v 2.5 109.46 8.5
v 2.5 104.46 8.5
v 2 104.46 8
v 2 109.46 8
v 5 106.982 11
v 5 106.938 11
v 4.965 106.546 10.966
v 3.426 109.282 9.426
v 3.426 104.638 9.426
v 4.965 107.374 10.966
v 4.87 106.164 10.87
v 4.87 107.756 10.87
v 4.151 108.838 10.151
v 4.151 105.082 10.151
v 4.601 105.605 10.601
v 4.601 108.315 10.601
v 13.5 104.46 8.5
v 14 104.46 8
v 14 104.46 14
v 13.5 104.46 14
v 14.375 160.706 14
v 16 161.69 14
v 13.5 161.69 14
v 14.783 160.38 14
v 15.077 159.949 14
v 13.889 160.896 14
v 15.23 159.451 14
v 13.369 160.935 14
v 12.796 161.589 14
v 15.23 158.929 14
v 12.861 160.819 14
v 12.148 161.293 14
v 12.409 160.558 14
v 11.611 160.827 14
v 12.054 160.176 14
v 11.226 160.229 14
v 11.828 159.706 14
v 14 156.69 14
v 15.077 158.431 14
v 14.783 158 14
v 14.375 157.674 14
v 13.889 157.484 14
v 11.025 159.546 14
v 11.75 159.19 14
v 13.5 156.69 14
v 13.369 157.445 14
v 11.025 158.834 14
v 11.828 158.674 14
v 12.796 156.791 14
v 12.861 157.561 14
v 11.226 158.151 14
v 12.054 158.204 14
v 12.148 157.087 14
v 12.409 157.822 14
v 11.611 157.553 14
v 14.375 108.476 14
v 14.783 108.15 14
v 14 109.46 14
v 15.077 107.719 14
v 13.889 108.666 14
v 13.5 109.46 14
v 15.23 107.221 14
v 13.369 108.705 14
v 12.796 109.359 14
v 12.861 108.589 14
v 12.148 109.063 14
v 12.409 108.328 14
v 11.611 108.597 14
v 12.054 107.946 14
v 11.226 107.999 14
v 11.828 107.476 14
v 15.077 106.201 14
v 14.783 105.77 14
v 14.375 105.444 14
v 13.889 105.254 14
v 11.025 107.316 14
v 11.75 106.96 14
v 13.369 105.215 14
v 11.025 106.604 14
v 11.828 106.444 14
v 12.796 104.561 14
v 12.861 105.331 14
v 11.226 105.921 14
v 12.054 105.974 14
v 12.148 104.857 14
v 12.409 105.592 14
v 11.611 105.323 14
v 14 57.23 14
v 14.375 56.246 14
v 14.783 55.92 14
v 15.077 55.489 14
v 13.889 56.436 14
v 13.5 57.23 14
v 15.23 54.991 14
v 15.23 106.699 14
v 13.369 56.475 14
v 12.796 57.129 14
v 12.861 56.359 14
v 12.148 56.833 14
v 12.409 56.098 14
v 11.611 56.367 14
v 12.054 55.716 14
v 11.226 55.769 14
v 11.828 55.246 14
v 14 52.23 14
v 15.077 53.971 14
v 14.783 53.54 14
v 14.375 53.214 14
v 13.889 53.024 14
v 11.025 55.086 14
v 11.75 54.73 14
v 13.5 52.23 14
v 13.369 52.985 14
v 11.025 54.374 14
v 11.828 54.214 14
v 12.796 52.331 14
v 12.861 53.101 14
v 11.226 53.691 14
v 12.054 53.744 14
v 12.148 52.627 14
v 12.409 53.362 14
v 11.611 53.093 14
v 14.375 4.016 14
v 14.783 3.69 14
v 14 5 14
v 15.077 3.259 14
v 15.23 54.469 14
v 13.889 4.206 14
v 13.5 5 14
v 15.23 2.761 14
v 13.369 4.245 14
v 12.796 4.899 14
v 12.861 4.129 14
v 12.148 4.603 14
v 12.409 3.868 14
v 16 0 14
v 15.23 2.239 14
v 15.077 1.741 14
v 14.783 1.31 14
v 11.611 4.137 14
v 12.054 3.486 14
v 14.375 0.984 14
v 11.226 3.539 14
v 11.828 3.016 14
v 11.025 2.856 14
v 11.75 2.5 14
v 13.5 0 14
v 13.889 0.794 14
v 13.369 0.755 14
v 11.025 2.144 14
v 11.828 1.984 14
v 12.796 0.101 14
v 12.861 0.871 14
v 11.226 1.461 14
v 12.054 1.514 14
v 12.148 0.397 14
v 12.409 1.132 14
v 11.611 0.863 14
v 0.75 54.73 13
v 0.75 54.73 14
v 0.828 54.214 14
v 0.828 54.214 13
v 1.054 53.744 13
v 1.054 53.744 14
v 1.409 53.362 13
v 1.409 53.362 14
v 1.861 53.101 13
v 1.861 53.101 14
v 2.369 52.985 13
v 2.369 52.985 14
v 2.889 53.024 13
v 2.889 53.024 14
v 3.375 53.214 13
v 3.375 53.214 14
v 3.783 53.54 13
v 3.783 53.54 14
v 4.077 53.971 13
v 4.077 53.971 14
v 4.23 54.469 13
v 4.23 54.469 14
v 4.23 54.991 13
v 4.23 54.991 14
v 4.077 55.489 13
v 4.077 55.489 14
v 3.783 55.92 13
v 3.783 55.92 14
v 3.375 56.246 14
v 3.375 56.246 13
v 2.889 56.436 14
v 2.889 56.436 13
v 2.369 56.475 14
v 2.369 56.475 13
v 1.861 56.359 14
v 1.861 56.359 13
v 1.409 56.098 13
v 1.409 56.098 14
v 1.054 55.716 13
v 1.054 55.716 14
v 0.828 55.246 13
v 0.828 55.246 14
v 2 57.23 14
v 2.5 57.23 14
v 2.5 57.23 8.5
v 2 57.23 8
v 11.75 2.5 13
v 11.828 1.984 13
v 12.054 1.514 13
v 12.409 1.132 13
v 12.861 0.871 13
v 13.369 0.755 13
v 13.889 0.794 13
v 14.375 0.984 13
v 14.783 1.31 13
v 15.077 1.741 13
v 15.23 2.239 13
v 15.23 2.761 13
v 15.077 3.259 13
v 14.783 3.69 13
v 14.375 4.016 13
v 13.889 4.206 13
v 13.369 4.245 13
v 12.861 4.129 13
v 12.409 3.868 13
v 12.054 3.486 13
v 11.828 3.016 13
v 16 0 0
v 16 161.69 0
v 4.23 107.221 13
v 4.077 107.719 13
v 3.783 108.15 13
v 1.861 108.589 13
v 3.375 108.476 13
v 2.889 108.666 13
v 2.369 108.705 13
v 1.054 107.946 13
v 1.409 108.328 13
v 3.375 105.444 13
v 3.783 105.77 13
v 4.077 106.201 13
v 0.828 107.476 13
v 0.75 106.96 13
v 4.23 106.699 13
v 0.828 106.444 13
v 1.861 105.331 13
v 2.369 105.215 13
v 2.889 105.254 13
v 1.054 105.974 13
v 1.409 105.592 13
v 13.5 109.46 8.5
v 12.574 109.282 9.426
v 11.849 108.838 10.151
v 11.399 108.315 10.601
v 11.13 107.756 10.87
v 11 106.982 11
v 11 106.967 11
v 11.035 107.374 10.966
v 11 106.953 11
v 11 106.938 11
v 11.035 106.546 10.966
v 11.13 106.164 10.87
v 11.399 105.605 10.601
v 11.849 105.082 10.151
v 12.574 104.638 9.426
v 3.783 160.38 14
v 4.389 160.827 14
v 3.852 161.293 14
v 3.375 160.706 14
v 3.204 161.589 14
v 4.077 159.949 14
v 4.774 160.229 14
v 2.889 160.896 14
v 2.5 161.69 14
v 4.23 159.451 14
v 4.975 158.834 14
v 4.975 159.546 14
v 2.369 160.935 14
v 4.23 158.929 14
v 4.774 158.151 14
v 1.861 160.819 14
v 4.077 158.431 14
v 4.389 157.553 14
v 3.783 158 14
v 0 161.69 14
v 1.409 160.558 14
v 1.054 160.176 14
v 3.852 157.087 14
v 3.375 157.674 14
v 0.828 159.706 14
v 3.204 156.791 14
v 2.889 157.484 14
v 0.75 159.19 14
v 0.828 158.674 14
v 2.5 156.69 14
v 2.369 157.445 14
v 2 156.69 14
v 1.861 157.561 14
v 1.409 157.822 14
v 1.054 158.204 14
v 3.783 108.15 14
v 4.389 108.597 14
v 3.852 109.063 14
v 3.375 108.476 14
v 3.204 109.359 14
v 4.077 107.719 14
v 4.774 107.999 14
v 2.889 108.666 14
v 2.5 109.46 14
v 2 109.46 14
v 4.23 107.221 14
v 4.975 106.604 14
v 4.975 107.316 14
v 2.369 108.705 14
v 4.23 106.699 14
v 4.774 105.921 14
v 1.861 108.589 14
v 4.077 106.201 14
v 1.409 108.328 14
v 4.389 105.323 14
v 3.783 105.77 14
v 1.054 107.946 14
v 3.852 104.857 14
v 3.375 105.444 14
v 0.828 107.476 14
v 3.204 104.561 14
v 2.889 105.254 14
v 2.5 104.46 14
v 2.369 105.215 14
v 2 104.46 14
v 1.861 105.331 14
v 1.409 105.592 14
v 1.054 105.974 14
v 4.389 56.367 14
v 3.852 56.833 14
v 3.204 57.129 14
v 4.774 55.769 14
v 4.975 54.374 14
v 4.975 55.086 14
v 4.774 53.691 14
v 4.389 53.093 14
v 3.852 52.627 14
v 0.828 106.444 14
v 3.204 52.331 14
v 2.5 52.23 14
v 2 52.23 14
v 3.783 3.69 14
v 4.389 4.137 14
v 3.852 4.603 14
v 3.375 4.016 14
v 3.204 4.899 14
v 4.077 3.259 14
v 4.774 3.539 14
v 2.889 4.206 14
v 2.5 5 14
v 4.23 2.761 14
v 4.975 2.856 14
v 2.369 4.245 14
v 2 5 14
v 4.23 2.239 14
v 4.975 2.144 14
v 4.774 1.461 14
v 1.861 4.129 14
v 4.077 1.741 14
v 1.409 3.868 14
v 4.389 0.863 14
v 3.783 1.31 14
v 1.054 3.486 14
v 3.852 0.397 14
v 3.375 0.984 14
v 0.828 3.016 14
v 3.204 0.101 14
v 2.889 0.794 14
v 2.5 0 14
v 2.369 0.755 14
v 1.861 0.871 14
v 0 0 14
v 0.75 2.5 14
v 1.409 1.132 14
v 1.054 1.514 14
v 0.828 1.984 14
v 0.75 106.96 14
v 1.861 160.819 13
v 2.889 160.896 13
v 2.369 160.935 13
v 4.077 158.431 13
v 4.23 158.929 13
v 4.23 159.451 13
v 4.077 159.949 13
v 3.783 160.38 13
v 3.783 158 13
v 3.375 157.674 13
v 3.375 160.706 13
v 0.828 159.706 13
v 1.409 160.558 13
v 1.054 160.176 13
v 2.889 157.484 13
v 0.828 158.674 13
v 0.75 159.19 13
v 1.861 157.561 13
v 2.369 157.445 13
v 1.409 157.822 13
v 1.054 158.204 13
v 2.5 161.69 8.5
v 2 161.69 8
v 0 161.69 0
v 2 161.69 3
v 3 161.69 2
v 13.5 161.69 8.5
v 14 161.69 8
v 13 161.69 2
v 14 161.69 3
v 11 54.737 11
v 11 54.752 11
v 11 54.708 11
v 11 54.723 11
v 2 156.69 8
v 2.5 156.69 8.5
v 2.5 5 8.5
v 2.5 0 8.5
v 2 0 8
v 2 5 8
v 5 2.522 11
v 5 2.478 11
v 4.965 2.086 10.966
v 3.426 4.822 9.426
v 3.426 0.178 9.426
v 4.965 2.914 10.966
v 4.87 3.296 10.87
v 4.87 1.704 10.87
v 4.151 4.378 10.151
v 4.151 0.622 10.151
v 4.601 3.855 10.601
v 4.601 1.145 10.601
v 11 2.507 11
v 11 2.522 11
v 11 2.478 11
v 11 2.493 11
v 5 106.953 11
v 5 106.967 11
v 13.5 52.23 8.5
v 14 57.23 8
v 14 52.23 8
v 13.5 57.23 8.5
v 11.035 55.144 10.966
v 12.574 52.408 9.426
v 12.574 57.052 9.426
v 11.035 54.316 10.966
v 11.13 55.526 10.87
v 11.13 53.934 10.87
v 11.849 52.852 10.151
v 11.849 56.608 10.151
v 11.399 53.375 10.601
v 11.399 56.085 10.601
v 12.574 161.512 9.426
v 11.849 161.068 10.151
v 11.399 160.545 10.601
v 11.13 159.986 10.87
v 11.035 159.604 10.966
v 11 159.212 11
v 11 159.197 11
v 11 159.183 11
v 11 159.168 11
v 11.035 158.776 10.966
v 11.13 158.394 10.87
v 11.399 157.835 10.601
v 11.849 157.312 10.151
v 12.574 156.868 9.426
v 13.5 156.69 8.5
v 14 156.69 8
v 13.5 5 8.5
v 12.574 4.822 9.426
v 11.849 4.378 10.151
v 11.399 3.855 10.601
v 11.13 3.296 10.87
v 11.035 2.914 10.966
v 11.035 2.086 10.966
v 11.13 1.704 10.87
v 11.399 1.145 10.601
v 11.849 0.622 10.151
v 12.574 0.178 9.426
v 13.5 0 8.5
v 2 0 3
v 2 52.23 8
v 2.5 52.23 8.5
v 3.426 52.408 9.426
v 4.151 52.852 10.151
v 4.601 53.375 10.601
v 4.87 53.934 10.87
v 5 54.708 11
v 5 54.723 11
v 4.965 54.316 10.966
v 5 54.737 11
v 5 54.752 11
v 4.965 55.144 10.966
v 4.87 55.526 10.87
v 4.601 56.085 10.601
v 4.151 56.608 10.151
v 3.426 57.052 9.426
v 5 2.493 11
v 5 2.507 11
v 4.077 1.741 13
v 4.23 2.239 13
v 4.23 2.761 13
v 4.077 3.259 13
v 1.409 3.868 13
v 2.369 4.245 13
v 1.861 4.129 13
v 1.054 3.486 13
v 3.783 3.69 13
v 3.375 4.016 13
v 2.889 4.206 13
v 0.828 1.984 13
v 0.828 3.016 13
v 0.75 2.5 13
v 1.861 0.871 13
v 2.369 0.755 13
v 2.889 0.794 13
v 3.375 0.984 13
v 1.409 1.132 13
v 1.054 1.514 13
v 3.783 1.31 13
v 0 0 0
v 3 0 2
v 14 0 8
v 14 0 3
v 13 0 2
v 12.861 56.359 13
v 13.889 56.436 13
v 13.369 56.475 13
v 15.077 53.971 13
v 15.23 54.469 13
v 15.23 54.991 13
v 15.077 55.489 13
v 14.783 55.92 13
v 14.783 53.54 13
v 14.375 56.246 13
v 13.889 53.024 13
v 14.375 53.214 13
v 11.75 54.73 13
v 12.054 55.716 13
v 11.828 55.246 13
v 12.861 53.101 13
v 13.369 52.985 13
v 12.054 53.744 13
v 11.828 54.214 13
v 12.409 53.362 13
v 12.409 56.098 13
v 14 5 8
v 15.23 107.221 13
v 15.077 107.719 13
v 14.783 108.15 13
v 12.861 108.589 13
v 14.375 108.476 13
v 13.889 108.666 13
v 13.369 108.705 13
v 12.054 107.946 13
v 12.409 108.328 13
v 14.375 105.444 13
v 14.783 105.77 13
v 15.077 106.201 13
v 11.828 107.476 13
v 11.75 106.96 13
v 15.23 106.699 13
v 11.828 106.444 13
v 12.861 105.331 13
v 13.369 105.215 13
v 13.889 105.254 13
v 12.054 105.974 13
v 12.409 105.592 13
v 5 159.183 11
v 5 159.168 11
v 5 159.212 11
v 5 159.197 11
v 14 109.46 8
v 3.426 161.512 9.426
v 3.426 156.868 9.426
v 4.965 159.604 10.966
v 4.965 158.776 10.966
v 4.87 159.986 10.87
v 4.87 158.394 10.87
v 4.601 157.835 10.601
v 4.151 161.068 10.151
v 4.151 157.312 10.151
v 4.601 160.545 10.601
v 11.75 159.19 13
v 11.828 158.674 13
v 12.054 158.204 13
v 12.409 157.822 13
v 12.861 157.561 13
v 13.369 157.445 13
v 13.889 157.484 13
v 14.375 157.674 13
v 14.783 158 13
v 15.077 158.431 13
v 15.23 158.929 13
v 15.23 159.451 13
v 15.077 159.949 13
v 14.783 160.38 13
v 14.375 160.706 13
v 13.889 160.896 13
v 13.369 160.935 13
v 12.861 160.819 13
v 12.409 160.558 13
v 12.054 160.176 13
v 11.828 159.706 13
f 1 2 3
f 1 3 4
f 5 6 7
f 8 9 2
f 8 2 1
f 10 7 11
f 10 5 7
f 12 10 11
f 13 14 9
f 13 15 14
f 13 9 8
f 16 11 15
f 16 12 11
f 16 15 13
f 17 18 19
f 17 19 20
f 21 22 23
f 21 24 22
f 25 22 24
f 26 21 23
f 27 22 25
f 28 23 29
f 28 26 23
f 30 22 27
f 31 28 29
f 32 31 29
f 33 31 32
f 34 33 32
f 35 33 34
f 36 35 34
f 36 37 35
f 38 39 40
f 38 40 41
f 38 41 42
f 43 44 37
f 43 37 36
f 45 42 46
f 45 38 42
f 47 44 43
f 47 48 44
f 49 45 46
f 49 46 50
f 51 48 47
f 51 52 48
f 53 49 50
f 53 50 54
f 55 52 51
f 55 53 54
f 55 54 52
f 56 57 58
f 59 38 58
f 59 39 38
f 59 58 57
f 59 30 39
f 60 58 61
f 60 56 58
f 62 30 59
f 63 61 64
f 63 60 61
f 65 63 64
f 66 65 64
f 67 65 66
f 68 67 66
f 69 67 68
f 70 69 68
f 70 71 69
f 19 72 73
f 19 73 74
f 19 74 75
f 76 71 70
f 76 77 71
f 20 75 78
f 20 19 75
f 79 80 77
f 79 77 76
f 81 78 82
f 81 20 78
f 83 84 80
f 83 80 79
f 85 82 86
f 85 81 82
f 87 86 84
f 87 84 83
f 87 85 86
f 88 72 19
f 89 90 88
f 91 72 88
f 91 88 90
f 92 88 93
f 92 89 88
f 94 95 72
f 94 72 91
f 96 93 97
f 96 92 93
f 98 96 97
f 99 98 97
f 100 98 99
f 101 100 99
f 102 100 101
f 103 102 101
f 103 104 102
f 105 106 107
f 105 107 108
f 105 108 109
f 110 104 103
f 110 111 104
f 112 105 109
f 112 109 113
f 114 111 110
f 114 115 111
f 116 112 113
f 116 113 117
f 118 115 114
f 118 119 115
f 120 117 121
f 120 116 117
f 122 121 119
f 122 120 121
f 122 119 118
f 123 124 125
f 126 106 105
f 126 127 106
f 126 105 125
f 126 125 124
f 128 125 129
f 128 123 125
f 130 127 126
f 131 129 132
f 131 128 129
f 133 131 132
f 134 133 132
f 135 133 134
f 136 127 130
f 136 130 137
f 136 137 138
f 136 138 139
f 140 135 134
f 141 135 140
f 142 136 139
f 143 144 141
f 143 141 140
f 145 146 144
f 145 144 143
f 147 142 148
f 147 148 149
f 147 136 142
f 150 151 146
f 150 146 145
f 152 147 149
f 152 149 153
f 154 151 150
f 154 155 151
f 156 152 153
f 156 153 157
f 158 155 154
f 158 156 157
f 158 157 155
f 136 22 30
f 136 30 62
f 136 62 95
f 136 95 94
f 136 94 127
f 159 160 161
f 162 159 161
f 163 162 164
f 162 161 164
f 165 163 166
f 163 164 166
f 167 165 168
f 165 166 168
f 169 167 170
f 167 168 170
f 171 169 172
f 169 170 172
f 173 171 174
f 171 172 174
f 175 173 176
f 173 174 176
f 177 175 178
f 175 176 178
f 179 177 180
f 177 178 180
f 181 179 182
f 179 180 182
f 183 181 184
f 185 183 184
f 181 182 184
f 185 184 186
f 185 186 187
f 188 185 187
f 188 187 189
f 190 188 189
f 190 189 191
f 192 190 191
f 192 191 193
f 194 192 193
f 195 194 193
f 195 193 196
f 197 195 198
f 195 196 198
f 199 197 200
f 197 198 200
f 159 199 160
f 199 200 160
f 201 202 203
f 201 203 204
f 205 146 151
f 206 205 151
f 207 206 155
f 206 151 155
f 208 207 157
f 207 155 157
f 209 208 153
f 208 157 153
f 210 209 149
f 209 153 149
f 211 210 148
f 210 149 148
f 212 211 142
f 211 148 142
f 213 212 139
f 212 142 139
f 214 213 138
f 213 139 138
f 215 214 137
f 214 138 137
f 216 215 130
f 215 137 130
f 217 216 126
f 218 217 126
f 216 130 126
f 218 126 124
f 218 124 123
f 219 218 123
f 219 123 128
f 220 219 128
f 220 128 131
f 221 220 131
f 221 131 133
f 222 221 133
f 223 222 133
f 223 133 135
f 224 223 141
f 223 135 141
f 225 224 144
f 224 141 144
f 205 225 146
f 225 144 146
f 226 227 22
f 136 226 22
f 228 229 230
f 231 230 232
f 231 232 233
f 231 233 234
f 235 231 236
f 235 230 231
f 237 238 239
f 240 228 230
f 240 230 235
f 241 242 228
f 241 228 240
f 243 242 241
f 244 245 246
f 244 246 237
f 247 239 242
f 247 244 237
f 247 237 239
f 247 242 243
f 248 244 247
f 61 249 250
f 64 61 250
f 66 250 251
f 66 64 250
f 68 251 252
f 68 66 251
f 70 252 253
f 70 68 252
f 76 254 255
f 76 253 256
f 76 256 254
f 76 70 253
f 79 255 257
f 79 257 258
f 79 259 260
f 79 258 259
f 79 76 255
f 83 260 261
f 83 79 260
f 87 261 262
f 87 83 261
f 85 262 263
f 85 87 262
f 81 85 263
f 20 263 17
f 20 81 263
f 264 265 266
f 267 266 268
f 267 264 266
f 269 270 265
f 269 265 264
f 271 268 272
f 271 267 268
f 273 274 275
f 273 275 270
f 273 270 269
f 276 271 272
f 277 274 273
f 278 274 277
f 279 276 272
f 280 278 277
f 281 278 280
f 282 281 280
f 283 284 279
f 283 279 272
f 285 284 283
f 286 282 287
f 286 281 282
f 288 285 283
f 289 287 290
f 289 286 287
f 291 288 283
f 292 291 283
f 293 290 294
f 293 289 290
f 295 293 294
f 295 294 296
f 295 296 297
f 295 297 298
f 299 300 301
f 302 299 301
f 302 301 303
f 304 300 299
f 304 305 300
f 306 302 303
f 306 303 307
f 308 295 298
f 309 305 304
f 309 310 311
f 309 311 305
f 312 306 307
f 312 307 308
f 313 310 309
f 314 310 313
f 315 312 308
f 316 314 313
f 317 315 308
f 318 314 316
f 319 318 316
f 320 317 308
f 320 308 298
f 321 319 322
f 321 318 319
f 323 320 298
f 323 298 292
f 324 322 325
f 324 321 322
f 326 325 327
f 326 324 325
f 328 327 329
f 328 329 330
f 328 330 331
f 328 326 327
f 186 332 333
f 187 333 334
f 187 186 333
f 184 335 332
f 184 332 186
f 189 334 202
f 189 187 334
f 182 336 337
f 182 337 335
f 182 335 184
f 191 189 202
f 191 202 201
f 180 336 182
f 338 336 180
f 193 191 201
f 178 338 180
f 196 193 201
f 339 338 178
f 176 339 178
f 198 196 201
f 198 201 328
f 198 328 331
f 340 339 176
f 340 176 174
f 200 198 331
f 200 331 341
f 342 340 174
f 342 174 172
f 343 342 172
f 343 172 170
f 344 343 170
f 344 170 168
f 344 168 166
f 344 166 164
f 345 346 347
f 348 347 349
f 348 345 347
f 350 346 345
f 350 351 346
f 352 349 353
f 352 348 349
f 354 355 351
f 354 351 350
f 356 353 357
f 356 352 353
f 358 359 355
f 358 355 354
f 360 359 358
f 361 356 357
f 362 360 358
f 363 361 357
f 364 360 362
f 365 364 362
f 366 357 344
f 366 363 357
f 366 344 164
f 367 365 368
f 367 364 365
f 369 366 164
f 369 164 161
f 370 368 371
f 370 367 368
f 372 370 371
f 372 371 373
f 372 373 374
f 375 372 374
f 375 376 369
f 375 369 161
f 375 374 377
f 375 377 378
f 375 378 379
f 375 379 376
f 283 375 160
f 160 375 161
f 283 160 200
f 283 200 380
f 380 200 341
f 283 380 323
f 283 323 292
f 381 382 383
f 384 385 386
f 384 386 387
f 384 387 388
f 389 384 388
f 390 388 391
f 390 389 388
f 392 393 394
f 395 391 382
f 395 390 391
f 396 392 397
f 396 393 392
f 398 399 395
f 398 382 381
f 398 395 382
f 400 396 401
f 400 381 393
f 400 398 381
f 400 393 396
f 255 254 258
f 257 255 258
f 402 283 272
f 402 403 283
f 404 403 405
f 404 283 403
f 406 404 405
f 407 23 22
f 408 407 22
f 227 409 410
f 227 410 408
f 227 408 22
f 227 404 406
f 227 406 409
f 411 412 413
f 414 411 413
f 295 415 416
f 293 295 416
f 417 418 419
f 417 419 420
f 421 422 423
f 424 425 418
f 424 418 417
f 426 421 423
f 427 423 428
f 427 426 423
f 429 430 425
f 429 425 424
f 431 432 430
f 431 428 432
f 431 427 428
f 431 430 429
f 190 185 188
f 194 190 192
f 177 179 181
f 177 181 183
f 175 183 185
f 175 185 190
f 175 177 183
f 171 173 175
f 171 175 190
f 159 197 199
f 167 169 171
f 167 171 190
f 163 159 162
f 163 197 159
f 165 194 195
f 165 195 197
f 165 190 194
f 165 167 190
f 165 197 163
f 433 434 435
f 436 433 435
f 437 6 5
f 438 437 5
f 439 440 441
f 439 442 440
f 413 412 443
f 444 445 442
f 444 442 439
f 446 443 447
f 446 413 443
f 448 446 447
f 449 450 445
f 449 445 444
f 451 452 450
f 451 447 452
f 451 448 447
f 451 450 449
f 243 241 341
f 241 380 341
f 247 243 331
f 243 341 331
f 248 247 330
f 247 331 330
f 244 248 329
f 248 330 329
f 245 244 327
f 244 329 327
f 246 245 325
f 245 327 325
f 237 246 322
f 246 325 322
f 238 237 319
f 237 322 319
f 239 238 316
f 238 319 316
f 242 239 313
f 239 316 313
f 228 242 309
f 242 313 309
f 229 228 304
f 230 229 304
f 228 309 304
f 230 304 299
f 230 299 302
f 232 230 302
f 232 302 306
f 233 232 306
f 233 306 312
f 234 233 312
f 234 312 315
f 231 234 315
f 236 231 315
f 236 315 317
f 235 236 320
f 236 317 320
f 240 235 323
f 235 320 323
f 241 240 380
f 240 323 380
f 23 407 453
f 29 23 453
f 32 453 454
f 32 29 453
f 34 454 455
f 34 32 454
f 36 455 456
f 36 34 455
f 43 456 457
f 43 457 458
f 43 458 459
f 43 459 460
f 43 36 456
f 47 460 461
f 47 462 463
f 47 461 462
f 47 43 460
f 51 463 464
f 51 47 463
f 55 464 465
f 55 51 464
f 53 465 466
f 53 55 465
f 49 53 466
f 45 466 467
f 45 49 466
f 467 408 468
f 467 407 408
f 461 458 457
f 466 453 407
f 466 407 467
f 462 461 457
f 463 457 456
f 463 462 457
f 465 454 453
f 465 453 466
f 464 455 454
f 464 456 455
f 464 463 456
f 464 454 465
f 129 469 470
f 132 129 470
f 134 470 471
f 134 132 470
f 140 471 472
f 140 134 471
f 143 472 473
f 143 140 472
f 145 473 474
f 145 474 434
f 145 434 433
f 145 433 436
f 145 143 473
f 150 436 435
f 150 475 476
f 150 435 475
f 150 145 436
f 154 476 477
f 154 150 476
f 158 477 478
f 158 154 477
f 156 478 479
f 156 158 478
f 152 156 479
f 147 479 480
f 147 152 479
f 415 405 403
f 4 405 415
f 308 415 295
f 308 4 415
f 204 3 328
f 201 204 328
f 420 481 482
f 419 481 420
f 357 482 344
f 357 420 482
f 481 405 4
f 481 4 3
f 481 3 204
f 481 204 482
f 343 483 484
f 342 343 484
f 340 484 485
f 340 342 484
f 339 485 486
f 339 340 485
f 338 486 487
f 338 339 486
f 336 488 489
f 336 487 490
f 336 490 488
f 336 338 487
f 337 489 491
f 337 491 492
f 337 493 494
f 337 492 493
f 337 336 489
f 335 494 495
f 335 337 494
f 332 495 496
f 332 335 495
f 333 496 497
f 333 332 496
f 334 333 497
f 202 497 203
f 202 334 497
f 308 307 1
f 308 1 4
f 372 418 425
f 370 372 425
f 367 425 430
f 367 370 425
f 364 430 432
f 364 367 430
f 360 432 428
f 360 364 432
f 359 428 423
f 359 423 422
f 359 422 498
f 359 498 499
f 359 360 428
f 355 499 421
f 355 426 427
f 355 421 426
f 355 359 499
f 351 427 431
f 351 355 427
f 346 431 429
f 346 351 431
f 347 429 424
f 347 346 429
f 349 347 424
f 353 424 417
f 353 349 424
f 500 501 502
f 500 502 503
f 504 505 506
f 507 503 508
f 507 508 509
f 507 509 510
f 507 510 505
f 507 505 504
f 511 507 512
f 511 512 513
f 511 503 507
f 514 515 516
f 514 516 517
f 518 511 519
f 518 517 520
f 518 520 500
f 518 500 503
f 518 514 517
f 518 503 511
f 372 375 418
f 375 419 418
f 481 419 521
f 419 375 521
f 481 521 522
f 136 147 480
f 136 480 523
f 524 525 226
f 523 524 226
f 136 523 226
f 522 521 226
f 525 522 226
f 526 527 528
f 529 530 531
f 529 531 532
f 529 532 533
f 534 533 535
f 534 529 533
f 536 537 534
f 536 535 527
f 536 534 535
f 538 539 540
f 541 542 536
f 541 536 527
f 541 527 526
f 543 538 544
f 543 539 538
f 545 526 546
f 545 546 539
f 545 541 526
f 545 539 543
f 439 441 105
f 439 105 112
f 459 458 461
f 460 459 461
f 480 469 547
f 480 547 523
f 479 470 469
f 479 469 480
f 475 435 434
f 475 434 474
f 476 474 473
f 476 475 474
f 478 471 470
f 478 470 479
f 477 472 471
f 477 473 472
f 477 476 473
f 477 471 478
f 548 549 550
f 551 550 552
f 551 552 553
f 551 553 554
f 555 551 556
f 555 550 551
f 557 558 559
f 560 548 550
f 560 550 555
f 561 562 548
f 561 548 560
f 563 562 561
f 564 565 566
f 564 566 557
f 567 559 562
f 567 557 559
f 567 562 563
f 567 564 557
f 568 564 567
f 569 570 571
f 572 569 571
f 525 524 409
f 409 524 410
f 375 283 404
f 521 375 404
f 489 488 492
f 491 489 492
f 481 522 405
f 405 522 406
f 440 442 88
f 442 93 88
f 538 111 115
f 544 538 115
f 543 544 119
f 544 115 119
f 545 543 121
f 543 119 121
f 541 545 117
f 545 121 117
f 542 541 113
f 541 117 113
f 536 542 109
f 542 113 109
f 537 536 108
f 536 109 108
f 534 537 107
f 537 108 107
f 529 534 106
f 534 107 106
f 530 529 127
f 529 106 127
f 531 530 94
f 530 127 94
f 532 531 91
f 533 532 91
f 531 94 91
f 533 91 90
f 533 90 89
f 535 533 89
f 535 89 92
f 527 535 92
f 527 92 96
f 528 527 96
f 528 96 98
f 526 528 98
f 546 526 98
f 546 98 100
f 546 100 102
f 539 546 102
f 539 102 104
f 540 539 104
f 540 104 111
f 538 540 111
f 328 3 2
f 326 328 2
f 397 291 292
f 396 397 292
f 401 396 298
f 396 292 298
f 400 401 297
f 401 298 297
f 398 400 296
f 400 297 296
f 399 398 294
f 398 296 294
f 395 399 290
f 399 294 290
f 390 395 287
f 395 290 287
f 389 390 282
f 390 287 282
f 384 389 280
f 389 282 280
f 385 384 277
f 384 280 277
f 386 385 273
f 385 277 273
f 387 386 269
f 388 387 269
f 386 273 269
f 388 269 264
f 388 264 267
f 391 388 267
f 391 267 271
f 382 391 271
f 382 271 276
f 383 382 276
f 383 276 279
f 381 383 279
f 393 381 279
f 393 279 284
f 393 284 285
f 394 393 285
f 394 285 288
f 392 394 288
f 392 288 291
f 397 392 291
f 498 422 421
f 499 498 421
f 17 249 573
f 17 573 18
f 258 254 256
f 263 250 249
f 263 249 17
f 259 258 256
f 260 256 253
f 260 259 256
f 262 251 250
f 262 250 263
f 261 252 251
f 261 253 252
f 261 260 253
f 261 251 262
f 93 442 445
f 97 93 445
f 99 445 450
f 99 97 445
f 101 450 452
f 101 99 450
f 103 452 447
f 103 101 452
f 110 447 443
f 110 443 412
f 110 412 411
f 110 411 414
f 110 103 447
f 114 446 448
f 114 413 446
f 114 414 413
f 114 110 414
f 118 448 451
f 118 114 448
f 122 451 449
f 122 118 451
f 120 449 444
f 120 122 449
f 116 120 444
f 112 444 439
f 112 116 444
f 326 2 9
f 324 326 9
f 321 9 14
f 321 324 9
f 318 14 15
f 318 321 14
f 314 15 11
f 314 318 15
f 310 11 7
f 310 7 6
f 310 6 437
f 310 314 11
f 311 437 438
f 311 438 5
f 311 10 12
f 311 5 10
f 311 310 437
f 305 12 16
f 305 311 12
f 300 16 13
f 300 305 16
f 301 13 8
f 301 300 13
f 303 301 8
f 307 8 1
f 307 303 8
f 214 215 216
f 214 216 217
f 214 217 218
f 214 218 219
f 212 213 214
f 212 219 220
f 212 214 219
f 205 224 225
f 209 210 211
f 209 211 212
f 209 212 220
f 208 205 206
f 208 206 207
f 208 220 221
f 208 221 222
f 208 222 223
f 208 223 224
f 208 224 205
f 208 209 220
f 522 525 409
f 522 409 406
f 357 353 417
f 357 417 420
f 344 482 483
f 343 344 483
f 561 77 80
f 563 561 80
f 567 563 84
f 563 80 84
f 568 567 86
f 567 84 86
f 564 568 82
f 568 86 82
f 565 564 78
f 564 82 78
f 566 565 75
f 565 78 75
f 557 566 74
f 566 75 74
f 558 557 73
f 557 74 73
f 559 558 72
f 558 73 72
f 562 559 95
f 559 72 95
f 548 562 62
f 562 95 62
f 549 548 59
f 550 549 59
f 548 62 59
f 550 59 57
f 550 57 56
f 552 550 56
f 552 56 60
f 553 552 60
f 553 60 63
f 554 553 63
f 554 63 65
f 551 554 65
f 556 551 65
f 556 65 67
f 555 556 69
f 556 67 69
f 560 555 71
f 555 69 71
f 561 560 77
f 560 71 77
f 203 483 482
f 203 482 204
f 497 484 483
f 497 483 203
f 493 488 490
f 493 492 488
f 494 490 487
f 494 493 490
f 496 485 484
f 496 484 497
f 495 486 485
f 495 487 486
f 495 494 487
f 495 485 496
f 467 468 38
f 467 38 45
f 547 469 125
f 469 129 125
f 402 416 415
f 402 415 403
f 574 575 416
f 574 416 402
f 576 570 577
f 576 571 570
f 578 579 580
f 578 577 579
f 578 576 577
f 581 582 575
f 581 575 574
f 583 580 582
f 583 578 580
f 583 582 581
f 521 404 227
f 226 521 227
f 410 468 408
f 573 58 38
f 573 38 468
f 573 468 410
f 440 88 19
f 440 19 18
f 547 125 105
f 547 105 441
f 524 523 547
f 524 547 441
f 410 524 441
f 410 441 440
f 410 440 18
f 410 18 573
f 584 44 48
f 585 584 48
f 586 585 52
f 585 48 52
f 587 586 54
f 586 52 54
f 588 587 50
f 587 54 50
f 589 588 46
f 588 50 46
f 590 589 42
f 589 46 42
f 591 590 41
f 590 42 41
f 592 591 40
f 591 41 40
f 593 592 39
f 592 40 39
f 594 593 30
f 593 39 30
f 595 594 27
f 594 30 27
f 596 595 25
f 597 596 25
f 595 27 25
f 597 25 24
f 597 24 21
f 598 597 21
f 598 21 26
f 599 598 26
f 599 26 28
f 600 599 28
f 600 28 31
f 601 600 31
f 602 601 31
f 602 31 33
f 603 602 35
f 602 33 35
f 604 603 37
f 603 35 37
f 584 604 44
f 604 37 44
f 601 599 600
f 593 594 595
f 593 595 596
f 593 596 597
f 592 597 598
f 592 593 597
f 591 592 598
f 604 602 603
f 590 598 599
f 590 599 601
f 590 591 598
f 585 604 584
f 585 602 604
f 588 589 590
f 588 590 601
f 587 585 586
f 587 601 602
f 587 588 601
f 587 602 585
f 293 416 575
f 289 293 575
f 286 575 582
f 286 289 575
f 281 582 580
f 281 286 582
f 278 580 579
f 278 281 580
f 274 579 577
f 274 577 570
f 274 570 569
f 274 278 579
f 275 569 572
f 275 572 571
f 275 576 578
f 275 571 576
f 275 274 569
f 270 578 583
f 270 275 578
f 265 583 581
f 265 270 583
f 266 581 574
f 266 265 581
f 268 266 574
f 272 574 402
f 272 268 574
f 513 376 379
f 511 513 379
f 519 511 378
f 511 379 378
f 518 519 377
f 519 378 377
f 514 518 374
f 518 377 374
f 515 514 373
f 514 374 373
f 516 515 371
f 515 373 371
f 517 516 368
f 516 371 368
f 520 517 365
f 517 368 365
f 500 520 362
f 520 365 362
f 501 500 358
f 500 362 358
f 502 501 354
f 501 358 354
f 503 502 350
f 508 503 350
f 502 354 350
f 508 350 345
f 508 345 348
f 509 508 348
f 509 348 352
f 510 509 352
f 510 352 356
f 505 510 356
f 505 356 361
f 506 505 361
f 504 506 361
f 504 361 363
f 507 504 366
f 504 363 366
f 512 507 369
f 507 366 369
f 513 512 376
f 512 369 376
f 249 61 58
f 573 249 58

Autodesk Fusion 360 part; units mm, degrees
sketch "3D-printed conduit outline" plane through (0, 0, 0) normal (0, 1, 0) x (1, 0, 0)
  line L0 (0, 0) -> (16, 0)
  line L1 (16, 0) -> (16, -14)
  line L2 (16, -14) -> (0, -14)
  line L3 (0, -14) -> (0, 0)
  line L4 (2, -14) -> (14, -14)
  line L5 (14, -14) -> (14, -2)
  line L6 (14, -2) -> (2, -2)
  line L7 (2, -2) -> (2, -14)
  dimension "d8" = 14
  dimension "d9" = 16
  dimension "d10" = 2
  dimension "d11" = 2
  dimension "d12" = 2
extrude "Extrude1" add sketch "3D-printed conduit outline" along normal blind 161.69 contours L0 L1 L2 L3 L5 L6 L7
sketch "Magnet holders" plane through (0, 0, 14) normal (0, 0, 1) x (-1, 0, 0)
  line L0 (0, 0) -> (-2, 0)
  line L1 (-2, 0) -> (-2, -161.69)
  line L2 (-2, -161.69) -> (0, -161.69)
  line L3 (0, -161.69) -> (0, 0)
  line L4 (-14, 0) -> (-16, 0)
  line L5 (-16, 0) -> (-16, -161.69)
  line L6 (-16, -161.69) -> (-14, -161.69)
  line L7 (-14, -161.69) -> (-14, 0)
  circle A0 centre (-2.5, -2.5) radius 2.5
  circle A1 centre (-2.5, -2.5) radius 1.75
  line L8 (-14, 0) -> (-2, 0)
  line L9 (0, 0) -> (-2.5, 0)
  line L10 (-2.5, 0) -> (-2.5, -5)
  line L11 (-2.5, -5) -> (0, -5)
  line L12 (0, -5) -> (0, 0)
  circle A2 centre (-13.5, -2.5) radius 2.5
  circle A3 centre (-13.5, -2.5) radius 1.75
  line L13 (-16, 0) -> (-13.5, 0)
  line L14 (-13.5, 0) -> (-13.5, -5)
  line L15 (-13.5, -5) -> (-16, -5)
  line L16 (-16, -5) -> (-16, 0)
  circle A4 centre (-2.5, -54.73) radius 1.75
  circle A5 centre (-2.5, -54.73) radius 2.5
  line L17 (-2.5, -52.23) -> (-2.5, -57.23)
  line L18 (-2.5, -57.23) -> (0, -57.23)
  line L19 (0, -57.23) -> (0, -52.23)
  line L20 (0, -52.23) -> (-2.5, -52.23)
  circle A6 centre (-13.5, -54.73) radius 1.75
  circle A7 centre (-13.5, -54.73) radius 2.5
  line L21 (-13.5, -52.23) -> (-13.5, -57.23)
  line L22 (-13.5, -57.23) -> (-16, -57.23)
  line L23 (-16, -57.23) -> (-16, -52.23)
  line L24 (-16, -52.23) -> (-13.5, -52.23)
  circle A8 centre (-2.5, -106.96) radius 1.75
  circle A9 centre (-2.5, -106.96) radius 2.5
  line L25 (-2.5, -104.46) -> (-2.5, -109.46)
  line L26 (-2.5, -109.46) -> (0, -109.46)
  line L27 (0, -109.46) -> (0, -104.46)
  line L28 (0, -104.46) -> (-2.5, -104.46)
  circle A10 centre (-13.5, -106.96) radius 1.75
  circle A11 centre (-13.5, -106.96) radius 2.5
  line L29 (-13.5, -104.46) -> (-13.5, -109.46)
  line L30 (-13.5, -109.46) -> (-16, -109.46)
  line L31 (-16, -109.46) -> (-16, -104.46)
  line L32 (-16, -104.46) -> (-13.5, -104.46)
  circle A12 centre (-2.5, -159.19) radius 1.75
  circle A13 centre (-2.5, -159.19) radius 2.5
  line L33 (-2.5, -156.69) -> (-2.5, -161.69)
  line L34 (-2.5, -161.69) -> (0, -161.69)
  line L35 (0, -161.69) -> (0, -156.69)
  line L36 (0, -156.69) -> (-2.5, -156.69)
  circle A14 centre (-13.5, -159.19) radius 1.75
  circle A15 centre (-13.5, -159.19) radius 2.5
  line L37 (-13.5, -156.69) -> (-13.5, -161.69)
  line L38 (-13.5, -161.69) -> (-16, -161.69)
  line L39 (-16, -161.69) -> (-16, -156.69)
  line L40 (-16, -156.69) -> (-13.5, -156.69)
  dimension "d15" = 5
  dimension "d16" = 3.5
  dimension "d17" = 5
  dimension "d18" = 3.5
  dimension "d21" = 0
  dimension "d22" = -156.69
extrude "Extrude2" add sketch "Magnet holders" against normal blind 3 contours A2 A3 L14 | L7 A2 A3 L14 | L7 L8 A2 L13 | L1 A0 L8 L9 | L1 A0 A1 L10 | A0 A1 L10 | L1 A0 A1 L10 | L1 A0 L11 | L1 A1 L10 | A1 L10 | L7 A3 L14 | A3 L14 | L1 A5 L20 | L7 A2 L15 | L7 A2 A3 L14 | L1 A4 A5 L17 | L1 A4 A5 L17 | L1 A5 L18 | A4 A5 L17 | L1 A4 L17 | A4 L17 | L7 A7 L24 | L1 A9 L28 | L7 A6 A7 L21 | A6 A7 L21 | L1 A8 A9 L25 | L1 A8 A9 L25 | L1 A9 L26 | A8 A9 L25 | L7 A6 L21 | A6 L21 | L7 A7 L22 | L7 A6 A7 L21 | L1 A8 L25 | A8 L25 | L1 A13 L36 | L7 A11 L32 | L1 A12 A13 L33 | L1 A12 A13 L33 | L1 A13 L34 | A12 A13 L33 | L7 A10 A11 L29 | L7 A11 L30 | L7 A10 A11 L29 | A10 A11 L29 | L1 A12 L33 | A12 L33 | L7 A10 L29 | A10 L29 | L7 A15 L40 | L7 A14 A15 L37 | L7 A15 L38 | L7 A14 A15 L37 | A14 A15 L37 | L7 A14 L37 | A14 L37
extrude "Extrude3" cut sketch "Magnet holders" against normal blind 1 contours L1 A1 | L1 A1 L10 | A1 L10 | L7 A3 L14 | A3 L14 | L7 A3 | L1 A4 | L1 A4 L17 | A4 L17 | L7 A6 L21 | L7 A6 | A6 L21 | L1 A8 | L1 A8 L25 | A8 L25 | L1 A12 | L1 A12 L33 | A12 L33 | L7 A10 L29 | L7 A10 | A10 L29 | L7 A14 L37 | L7 A14 | A14 L37
chamfer "Chamfer1" distance 1 angle 45 2 edges at (2, 80.845, 2) (14, 80.845, 2)
chamfer "Chamfer2" distance 2.9999 angle 45 8 edges at (2, 2.5, 11) (2, 54.73, 11) (2, 106.96, 11) (2, 159.19, 11) (14, 2.5, 11) (14, 54.73, 11) (14, 106.96, 11) (14, 159.19, 11)
equation "conduit_length = 161.69 mm"
equation "conduit_width = 16 mm"
equation "conduit_height = 16 mm"
equation "conduit_wall_thickness = 2 mm"
equation "magnet_diameter = 3 mm"
equation "magnet_height = 1 mm"
equation "d8 = conduit_height - conduit_wall_thickness"
equation "d9 = conduit_width"
equation "d10 = conduit_wall_thickness"
equation "d11 = conduit_wall_thickness"
equation "d12 = conduit_wall_thickness"
equation "d13 = conduit_length"
equation "d15 = magnet_diameter + 2 mm"
equation "d16 = magnet_diameter + 0.5 mm"
equation "d17 = magnet_diameter + 2 mm"
equation "d18 = magnet_diameter + 0.5 mm"
equation "d22 = -conduit_length + ( magnet_diameter + 2 mm )"
equation "d23 = -( magnet_height + 2 mm )"
